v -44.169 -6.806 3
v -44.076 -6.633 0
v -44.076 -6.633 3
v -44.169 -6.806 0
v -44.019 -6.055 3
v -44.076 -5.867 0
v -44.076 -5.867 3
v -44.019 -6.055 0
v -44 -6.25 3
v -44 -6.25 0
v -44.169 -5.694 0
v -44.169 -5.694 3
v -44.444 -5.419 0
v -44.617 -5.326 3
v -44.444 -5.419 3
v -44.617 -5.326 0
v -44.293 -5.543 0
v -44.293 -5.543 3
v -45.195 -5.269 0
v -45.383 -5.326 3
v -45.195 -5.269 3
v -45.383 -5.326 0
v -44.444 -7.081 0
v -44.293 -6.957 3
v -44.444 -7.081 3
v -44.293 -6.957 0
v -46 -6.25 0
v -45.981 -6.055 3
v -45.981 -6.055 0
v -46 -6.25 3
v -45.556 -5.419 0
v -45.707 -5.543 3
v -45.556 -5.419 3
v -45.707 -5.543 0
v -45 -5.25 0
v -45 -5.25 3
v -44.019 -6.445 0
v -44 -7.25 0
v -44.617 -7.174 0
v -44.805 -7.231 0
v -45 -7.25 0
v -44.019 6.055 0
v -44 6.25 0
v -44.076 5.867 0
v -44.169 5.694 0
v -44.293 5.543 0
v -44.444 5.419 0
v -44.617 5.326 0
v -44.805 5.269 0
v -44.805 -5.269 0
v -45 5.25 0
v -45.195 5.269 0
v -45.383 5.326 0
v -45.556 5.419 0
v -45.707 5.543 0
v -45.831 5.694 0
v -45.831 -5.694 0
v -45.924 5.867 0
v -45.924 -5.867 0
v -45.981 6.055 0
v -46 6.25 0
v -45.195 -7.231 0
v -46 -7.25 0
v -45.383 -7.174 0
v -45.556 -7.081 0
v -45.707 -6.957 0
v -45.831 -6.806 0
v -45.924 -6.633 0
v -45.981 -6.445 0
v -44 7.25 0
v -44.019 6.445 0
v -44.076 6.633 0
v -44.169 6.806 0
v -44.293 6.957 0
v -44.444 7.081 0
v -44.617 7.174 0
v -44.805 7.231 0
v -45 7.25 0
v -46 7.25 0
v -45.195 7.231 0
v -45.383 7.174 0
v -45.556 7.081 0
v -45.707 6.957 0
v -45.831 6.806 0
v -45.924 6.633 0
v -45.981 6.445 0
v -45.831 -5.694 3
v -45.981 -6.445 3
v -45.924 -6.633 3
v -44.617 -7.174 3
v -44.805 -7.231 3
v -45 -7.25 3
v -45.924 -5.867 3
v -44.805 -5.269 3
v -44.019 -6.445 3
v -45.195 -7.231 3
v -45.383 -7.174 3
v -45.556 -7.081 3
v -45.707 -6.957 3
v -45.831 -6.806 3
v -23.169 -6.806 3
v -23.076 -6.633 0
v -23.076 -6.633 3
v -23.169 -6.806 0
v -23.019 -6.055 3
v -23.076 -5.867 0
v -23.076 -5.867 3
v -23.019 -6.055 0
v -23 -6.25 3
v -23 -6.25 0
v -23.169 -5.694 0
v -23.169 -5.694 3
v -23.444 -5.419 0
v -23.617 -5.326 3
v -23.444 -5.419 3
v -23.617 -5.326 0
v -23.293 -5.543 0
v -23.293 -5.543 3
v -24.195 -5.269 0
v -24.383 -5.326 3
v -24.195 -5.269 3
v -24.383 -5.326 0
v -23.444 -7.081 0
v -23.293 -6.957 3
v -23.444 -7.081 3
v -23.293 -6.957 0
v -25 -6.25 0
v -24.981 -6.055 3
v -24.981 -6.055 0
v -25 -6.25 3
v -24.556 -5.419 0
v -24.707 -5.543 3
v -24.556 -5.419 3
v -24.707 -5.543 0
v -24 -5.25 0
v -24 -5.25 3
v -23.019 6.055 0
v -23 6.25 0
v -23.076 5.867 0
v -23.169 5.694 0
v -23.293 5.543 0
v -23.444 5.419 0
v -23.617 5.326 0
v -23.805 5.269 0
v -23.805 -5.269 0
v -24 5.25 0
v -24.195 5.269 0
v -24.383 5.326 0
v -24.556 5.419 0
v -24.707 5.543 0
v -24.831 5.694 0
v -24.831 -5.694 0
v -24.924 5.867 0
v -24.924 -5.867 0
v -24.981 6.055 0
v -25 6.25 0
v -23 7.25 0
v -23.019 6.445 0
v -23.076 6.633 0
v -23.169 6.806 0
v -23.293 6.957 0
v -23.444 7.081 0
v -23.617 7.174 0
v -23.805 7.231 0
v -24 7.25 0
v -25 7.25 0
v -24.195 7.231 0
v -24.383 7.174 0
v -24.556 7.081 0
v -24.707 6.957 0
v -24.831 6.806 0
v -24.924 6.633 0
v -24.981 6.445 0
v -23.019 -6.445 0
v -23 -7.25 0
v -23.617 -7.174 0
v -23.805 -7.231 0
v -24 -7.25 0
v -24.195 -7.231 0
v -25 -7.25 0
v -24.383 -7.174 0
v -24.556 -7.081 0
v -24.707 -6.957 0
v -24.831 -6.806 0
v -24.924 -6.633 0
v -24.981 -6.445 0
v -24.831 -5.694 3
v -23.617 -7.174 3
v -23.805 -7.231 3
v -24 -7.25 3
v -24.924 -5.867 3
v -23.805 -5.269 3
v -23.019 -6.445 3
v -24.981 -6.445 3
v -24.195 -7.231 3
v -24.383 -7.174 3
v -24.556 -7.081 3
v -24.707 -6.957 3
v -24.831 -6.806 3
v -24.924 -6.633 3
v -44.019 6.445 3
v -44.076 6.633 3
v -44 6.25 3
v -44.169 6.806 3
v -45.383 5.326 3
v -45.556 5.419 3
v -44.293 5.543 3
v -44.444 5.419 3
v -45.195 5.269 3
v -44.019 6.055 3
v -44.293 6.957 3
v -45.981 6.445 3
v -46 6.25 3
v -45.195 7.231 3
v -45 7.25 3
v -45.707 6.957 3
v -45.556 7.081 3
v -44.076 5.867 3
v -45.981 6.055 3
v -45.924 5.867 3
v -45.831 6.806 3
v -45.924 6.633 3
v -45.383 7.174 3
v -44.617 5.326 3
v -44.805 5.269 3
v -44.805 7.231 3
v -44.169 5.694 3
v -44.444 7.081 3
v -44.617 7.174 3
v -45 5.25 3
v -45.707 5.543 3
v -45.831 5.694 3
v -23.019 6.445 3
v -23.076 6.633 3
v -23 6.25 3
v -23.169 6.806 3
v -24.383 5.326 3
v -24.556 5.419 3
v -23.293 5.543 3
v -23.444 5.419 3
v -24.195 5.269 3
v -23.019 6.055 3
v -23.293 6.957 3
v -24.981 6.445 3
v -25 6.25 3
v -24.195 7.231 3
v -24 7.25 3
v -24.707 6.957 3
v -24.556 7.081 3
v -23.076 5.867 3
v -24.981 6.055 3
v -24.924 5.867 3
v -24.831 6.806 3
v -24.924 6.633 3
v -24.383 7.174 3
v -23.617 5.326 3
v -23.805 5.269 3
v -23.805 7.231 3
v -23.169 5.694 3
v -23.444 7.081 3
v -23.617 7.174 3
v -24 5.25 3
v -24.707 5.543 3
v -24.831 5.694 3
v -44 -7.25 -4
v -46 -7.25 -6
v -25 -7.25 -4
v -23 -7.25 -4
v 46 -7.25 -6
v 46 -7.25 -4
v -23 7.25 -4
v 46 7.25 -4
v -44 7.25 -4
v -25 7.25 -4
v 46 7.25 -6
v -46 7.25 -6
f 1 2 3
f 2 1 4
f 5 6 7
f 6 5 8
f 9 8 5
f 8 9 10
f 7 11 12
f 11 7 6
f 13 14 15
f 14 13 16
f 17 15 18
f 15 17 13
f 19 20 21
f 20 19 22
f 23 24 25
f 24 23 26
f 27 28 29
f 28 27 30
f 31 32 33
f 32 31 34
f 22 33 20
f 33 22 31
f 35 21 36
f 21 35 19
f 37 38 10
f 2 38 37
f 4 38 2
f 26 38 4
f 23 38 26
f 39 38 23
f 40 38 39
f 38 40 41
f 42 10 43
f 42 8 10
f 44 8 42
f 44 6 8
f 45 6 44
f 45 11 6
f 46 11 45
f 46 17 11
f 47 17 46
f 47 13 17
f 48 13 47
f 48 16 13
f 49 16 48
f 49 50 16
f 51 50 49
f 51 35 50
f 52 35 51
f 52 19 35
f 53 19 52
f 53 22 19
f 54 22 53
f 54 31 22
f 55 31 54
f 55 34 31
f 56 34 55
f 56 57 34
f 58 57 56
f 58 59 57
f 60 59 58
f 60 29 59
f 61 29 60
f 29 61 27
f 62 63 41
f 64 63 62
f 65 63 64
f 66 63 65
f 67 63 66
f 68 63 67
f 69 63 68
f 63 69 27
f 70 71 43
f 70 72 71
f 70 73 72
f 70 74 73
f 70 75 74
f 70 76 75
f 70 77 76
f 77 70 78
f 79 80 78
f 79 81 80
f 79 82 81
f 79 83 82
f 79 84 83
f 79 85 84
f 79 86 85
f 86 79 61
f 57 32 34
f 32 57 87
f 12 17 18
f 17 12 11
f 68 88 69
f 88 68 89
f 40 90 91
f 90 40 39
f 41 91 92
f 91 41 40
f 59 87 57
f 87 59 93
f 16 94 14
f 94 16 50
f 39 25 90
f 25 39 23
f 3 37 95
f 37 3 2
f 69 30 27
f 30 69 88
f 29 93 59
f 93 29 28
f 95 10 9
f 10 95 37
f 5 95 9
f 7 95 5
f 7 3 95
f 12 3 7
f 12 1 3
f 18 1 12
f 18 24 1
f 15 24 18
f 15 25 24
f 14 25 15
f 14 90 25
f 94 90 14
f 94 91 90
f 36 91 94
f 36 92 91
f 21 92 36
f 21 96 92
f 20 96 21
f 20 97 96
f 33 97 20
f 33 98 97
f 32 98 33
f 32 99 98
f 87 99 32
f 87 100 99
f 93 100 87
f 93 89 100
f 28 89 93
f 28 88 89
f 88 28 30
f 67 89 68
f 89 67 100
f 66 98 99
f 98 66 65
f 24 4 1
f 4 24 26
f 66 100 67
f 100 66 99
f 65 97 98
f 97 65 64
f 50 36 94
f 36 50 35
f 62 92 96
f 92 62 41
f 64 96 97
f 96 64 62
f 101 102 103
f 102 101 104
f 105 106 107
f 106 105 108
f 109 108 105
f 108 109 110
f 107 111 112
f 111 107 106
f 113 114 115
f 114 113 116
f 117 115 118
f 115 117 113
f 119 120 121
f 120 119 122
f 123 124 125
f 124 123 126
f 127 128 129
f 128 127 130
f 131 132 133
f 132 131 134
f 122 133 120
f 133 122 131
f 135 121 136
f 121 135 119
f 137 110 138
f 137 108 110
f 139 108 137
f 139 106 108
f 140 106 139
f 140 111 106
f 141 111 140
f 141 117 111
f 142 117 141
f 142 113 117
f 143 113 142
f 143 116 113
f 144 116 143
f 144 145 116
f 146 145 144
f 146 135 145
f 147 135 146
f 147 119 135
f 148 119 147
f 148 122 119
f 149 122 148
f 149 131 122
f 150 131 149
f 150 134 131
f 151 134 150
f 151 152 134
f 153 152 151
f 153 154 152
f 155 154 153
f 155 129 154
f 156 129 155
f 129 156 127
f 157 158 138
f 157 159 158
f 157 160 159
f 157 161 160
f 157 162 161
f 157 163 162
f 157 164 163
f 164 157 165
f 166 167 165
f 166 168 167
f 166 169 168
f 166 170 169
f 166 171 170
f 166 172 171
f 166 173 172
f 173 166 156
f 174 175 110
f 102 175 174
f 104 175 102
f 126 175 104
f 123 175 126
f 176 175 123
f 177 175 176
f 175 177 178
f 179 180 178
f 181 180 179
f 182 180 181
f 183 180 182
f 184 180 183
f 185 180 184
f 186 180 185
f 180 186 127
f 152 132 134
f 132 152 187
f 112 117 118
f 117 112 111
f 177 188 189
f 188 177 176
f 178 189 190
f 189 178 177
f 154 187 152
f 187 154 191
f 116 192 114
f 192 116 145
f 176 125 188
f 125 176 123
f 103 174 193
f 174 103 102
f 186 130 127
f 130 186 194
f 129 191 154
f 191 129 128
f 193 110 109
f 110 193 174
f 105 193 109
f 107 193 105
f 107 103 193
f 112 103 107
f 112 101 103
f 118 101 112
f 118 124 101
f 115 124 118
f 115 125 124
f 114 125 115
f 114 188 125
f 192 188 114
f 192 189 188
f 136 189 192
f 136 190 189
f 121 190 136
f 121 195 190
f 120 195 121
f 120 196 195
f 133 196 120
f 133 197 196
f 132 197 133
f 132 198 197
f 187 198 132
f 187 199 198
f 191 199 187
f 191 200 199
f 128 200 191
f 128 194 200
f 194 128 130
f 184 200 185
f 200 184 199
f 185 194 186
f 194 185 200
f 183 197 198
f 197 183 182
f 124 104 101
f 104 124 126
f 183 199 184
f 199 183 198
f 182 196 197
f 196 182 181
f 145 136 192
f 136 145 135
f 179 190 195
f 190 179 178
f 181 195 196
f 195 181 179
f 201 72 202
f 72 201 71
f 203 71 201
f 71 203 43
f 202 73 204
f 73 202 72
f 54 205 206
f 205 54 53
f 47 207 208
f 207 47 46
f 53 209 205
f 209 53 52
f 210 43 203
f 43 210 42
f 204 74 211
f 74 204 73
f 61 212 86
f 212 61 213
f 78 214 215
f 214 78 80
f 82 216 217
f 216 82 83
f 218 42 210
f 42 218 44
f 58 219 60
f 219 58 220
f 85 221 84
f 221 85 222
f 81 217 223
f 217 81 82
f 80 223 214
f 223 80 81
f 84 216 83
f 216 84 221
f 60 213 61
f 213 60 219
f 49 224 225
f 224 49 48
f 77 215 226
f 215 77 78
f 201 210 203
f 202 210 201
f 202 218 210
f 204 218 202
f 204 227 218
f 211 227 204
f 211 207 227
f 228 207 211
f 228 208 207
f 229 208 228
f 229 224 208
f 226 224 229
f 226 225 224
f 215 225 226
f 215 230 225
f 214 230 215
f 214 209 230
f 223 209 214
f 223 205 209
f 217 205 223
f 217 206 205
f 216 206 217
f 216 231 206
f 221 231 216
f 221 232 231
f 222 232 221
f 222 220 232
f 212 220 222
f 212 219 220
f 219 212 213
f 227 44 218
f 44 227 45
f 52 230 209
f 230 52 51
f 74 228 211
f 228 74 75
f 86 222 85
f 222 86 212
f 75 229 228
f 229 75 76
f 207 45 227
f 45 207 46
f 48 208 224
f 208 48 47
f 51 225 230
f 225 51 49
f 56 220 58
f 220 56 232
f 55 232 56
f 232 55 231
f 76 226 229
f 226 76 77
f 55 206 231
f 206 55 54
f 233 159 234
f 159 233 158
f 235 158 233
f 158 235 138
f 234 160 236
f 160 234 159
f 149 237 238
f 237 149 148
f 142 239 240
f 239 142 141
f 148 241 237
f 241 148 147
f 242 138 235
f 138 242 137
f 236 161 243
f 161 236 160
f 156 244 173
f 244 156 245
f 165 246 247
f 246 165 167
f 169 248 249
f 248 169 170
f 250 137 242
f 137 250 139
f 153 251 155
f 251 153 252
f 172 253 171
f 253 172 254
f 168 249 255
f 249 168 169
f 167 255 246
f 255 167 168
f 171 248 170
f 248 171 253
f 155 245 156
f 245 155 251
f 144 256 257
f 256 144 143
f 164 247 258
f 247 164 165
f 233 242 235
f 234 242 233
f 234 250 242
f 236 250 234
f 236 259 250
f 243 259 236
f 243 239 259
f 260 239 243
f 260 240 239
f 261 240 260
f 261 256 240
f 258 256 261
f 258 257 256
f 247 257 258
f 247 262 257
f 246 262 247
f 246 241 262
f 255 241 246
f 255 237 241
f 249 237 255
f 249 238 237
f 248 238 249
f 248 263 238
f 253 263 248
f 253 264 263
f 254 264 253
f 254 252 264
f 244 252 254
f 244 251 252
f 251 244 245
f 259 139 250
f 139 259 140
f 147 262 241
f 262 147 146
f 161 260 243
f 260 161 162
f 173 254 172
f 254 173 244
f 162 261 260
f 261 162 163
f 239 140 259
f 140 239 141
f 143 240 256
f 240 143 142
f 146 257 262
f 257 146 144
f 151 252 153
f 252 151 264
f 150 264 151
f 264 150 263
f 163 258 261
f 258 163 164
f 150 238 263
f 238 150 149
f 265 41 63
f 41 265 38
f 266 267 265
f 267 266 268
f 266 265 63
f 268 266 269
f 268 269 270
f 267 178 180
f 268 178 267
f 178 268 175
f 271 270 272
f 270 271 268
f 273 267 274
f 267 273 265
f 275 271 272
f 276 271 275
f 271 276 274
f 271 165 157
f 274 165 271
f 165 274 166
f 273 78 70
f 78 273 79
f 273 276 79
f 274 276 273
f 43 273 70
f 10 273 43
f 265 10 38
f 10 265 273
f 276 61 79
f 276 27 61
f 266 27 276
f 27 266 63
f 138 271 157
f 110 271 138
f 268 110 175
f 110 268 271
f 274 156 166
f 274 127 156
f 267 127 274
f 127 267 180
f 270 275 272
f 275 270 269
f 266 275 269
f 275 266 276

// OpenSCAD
//
// raspberry pi cameras mount
//
// copyright 2014 Sebastien Roy
// Licence: Public domain
//

/* [General] */

// Reduce the diameter of the pegs (units are 0.01mm, so for 0.1mm enter 10)
tolerance=0; // [0:100]

camera_width = 21;
num_cameras = 4;
margins = 2;
full_rig_width = (camera_width * num_cameras) + (margins * (num_cameras - 1));

// to stop customizer
module nop() { }


module centercube(sz) {
	translate(sz/-2) cube(sz);
}

//
// peg: radius of the peg cylinder. Normally 1mm
//
module camera(peg=1.0) {
	// pegs
	translate([-full_rig_width,-12.5,0]/2) cylinder(r=peg,h=3,$fn=32);
	translate([(-full_rig_width + (camera_width*2)),-12.5,0]/2) cylinder(r=peg,h=3,$fn=32);
	translate([-full_rig_width,12.5,0]/2) cylinder(r=peg,h=3,$fn=32);
	translate([(-full_rig_width + (camera_width*2)),12.5,0]/2) cylinder(r=peg,h=3,$fn=32);
	// peg holders
	hull() {
	translate([-full_rig_width,-12.5,-4]/2) centercube([2,2,4]);
	translate([-full_rig_width,12.5,-4]/2) centercube([2,2,4]);
	}
	hull() {
	translate([(-full_rig_width + (camera_width*2)),-12.5,-4]/2) centercube([2,2,4]);
	translate([(-full_rig_width + (camera_width*2)),12.5,-4]/2) centercube([2,2,4]);
	}
	// base
	hull() {
	translate([-full_rig_width,12.5,-10]/2) centercube([2,2,2]);
	translate([full_rig_width,12.5,-10]/2) centercube([2,2,2]);
    translate([full_rig_width,-12.5,-10]/2) centercube([2,2,2]);
    translate([-full_rig_width,-12.5,-10]/2) centercube([2,2,2]);
	}
	

}

// call with the radius of the peg
camera(1-tolerance/200);
